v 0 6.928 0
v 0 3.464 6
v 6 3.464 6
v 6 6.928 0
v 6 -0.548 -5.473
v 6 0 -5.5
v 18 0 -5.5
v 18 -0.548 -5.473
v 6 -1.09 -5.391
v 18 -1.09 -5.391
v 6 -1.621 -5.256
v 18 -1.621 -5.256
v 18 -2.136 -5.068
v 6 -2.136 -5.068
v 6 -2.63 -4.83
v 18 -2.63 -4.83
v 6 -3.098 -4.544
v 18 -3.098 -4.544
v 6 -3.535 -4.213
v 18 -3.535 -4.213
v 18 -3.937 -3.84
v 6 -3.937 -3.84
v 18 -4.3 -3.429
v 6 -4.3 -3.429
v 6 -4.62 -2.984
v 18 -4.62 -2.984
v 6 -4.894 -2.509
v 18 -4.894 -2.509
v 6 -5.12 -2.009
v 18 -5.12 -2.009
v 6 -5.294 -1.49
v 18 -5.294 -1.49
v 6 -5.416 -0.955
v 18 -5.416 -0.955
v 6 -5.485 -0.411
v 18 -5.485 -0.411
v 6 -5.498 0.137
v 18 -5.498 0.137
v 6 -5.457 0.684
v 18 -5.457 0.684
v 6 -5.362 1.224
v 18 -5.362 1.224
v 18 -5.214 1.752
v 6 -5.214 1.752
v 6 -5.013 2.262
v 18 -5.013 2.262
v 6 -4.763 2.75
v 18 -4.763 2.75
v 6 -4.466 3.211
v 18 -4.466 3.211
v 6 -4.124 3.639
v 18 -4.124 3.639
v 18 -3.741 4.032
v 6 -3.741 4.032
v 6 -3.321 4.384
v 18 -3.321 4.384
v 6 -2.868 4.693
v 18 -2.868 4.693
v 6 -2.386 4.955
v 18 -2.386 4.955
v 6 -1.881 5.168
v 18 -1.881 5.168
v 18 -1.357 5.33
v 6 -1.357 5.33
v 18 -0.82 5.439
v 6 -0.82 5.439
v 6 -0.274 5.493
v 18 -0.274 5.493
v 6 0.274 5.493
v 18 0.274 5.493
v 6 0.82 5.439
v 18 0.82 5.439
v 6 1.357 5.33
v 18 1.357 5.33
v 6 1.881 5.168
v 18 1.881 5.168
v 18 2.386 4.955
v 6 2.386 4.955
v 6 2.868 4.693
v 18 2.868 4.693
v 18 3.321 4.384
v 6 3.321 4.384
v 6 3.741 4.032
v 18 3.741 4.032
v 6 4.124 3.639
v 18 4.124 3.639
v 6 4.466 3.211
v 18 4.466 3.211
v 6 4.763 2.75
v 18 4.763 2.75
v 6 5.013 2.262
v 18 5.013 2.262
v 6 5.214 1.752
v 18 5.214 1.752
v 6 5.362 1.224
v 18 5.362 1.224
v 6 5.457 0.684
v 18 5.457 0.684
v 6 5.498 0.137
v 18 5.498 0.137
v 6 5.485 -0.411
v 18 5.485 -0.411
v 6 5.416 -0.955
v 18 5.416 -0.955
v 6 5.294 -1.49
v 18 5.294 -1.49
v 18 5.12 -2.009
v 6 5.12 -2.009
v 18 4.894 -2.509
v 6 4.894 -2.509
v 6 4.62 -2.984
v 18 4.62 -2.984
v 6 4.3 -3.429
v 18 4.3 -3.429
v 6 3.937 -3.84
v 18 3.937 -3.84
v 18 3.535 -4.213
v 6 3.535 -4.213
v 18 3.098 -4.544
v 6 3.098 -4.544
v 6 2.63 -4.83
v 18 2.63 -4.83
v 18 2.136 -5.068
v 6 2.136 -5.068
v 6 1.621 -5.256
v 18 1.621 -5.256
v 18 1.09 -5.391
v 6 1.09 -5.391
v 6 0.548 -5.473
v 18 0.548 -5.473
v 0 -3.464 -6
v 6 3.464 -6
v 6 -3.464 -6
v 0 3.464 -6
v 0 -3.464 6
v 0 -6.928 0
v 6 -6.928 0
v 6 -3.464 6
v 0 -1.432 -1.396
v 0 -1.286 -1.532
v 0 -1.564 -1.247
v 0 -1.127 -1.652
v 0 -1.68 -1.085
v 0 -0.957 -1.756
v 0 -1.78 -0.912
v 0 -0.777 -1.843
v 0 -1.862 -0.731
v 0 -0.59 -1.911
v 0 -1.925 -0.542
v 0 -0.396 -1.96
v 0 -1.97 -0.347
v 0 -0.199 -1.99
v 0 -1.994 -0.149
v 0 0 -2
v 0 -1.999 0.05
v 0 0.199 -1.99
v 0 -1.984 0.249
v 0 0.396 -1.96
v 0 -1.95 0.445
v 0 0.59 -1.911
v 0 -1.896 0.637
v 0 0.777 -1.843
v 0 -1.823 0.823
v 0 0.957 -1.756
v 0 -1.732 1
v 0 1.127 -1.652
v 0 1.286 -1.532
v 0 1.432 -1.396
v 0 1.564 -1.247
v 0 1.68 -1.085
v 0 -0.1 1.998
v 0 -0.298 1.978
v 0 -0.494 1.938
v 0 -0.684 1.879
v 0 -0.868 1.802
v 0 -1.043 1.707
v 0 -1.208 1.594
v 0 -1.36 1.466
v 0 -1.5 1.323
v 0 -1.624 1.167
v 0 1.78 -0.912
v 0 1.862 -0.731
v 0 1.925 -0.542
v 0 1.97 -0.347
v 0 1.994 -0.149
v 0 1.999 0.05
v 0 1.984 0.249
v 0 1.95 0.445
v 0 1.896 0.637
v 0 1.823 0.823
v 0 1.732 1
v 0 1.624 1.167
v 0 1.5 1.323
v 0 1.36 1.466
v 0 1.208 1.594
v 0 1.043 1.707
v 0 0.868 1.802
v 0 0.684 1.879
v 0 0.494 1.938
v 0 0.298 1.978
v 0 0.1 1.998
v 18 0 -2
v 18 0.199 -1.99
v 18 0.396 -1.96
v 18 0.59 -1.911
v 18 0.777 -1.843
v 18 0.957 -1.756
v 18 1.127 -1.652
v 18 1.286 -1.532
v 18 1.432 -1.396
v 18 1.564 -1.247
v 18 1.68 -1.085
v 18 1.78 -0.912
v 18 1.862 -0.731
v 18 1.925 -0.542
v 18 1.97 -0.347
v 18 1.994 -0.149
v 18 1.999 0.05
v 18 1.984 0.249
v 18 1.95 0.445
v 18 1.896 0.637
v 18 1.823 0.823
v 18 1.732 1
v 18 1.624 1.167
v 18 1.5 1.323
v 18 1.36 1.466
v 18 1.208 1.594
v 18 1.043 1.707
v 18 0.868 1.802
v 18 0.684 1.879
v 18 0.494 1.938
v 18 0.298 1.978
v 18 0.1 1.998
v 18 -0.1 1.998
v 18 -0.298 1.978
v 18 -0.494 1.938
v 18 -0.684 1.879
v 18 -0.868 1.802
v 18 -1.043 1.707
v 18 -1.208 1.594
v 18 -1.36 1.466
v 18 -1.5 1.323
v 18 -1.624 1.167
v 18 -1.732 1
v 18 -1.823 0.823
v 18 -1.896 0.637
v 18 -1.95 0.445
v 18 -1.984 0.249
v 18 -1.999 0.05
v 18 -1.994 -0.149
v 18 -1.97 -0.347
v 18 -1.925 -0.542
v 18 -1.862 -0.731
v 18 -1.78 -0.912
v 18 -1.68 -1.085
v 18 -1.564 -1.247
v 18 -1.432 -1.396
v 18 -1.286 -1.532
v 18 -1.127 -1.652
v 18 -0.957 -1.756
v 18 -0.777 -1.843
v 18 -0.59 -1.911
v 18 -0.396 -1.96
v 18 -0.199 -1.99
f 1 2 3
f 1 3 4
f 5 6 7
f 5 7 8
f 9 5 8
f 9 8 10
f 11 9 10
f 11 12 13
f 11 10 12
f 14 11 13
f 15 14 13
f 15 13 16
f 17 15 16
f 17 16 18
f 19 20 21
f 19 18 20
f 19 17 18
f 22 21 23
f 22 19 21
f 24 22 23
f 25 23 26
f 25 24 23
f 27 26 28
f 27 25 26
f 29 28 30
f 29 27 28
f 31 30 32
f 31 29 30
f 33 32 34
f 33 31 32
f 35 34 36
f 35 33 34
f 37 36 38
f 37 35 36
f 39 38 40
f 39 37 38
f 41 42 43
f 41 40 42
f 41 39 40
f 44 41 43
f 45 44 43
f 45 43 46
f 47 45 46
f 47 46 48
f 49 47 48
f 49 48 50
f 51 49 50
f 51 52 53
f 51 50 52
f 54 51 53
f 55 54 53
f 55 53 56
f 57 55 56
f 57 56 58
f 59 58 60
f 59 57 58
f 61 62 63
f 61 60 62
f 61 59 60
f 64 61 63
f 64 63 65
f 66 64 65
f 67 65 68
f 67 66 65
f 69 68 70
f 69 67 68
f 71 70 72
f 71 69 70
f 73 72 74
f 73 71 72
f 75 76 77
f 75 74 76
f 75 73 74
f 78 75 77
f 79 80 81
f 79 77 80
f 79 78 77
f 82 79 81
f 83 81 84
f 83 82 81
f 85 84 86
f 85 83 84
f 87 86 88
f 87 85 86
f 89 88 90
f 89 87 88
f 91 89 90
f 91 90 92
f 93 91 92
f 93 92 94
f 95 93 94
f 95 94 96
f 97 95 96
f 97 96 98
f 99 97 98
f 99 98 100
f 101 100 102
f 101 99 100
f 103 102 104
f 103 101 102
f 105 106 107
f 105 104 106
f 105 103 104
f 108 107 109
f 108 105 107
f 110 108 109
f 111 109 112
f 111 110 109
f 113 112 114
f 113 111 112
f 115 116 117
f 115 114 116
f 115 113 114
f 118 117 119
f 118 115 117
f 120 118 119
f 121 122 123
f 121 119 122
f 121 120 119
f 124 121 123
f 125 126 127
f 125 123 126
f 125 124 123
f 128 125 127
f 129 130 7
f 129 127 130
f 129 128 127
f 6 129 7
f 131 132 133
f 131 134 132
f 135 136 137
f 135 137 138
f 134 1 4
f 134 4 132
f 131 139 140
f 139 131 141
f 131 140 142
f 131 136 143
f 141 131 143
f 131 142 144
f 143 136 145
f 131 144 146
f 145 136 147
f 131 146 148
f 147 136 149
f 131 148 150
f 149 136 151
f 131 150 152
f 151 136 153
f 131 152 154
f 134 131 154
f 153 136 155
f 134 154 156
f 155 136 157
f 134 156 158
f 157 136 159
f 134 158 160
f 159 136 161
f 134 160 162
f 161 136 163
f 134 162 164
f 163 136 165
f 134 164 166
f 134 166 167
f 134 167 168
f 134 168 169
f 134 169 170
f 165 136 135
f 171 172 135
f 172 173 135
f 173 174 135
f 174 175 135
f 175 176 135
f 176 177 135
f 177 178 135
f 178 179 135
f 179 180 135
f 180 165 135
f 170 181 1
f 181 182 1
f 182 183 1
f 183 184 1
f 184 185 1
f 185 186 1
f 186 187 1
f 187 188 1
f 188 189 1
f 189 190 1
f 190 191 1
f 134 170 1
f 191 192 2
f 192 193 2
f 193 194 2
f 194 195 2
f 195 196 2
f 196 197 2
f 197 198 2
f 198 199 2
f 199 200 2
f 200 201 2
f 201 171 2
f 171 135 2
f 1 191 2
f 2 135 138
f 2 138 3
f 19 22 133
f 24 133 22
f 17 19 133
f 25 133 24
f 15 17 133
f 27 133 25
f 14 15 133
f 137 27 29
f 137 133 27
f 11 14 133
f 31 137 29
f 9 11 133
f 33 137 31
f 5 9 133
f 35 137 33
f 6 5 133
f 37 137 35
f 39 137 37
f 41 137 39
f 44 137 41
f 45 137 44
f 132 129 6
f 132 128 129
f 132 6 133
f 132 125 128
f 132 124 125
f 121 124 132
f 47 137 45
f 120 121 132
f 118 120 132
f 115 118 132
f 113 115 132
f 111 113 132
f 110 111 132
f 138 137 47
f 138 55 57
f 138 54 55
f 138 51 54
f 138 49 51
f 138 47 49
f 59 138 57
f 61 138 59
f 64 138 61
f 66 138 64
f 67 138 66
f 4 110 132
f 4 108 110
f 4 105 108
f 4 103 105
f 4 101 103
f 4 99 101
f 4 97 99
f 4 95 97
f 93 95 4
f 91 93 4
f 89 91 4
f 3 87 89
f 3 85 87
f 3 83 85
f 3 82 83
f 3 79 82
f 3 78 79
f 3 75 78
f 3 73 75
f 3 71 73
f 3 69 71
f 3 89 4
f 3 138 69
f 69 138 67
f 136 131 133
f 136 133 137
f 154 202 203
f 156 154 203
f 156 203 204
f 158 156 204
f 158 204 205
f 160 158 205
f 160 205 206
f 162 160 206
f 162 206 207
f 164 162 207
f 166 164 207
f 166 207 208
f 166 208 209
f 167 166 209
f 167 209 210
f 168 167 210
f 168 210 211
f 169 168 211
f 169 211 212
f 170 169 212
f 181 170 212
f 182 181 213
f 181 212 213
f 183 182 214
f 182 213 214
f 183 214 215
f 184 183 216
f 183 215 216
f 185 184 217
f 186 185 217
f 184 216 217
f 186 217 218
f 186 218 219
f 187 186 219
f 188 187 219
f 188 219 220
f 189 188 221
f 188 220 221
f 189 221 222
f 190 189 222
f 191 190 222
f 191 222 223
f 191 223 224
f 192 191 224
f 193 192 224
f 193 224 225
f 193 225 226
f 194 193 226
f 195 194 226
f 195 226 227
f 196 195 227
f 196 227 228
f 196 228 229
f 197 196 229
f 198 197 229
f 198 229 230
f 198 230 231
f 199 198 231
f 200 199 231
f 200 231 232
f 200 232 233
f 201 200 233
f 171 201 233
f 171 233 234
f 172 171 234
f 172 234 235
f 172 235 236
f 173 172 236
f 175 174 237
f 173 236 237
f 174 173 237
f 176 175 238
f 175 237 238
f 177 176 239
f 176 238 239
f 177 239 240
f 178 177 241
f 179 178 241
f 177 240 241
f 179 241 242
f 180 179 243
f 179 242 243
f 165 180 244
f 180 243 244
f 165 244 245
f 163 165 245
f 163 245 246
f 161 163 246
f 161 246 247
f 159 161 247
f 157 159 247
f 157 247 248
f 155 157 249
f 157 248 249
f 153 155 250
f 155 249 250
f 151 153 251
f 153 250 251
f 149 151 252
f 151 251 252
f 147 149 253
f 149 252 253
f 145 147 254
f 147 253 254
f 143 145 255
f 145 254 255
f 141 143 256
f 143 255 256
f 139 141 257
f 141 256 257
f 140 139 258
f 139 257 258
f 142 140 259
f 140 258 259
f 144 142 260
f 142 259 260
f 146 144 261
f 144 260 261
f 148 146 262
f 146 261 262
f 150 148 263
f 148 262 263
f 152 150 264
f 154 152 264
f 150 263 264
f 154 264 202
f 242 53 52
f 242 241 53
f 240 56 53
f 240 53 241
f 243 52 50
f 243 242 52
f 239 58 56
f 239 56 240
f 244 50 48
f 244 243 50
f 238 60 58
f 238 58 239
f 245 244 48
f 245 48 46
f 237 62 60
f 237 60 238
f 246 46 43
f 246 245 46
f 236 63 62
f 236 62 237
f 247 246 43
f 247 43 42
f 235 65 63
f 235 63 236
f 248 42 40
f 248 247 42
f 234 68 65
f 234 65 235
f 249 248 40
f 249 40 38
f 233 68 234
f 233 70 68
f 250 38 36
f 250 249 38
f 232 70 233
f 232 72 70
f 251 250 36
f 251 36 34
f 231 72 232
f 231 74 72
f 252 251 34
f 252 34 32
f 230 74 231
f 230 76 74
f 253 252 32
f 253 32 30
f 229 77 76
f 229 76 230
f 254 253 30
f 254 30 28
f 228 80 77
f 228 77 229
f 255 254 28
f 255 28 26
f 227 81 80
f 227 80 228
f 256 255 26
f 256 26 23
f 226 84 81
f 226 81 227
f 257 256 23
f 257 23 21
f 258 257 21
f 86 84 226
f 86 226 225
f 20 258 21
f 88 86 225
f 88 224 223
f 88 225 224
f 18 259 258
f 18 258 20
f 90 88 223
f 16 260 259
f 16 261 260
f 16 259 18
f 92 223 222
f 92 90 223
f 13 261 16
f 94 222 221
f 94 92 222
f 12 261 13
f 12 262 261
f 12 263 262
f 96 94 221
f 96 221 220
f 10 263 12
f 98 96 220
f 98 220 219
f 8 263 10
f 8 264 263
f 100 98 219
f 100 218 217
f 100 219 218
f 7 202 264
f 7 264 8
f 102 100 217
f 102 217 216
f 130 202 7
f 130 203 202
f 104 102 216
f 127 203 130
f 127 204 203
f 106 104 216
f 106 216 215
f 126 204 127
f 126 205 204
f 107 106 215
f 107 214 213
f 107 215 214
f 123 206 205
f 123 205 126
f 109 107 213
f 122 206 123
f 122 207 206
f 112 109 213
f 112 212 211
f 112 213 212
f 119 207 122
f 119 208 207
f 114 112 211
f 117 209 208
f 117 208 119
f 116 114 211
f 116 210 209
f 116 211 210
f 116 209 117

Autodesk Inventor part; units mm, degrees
ref_plane "YZ Plane" through (0, 0, 0) normal (1, 0, 0) x (0, 1, 0)
ref_plane "XZ Plane" through (0, 0, 0) normal (0, 1, 0) x (-1, 0, 0)
ref_plane "XY Plane" through (0, 0, 0) normal (0, 0, 1) x (1, 0, 0)
sketch "Skizze1" plane through (0, 0, 0) normal (1, 0, 0) x (0, 1, 0)
  line L0 (6.9282, 0) -> (3.4641, -6)
  line L1 (3.4641, -6) -> (-3.4641, -6)
  line L2 (-3.4641, -6) -> (-6.9282, 0)
  line L3 (-6.9282, 0) -> (-3.4641, 6)
  line L4 (-3.4641, 6) -> (3.4641, 6)
  line L5 (3.4641, 6) -> (6.9282, 0)
  point P0 (0, 0)
  point P1 (0, 0)
  dimension "d0" = 12
extrude "Extrusion1" add sketch "Skizze1" along normal blind 6
sketch "Skizze2" plane through (6, 0, 0) normal (1, 0, 0) x (0, 0, -1)
  circle A0 centre (0, 0) radius 5.5
  dimension "d3" = 11
extrude "Extrusion2" add sketch "Skizze2" along normal blind 12
sketch "Skizze3" plane through (18, 0, 0) normal (1, 0, 0) x (0, 0, -1)
  circle A0 centre (0, 0) radius 2
  dimension "d6" = 4
extrude "Extrusion3" cut sketch "Skizze3" against normal through all
properties part number "MotorAdapter"
